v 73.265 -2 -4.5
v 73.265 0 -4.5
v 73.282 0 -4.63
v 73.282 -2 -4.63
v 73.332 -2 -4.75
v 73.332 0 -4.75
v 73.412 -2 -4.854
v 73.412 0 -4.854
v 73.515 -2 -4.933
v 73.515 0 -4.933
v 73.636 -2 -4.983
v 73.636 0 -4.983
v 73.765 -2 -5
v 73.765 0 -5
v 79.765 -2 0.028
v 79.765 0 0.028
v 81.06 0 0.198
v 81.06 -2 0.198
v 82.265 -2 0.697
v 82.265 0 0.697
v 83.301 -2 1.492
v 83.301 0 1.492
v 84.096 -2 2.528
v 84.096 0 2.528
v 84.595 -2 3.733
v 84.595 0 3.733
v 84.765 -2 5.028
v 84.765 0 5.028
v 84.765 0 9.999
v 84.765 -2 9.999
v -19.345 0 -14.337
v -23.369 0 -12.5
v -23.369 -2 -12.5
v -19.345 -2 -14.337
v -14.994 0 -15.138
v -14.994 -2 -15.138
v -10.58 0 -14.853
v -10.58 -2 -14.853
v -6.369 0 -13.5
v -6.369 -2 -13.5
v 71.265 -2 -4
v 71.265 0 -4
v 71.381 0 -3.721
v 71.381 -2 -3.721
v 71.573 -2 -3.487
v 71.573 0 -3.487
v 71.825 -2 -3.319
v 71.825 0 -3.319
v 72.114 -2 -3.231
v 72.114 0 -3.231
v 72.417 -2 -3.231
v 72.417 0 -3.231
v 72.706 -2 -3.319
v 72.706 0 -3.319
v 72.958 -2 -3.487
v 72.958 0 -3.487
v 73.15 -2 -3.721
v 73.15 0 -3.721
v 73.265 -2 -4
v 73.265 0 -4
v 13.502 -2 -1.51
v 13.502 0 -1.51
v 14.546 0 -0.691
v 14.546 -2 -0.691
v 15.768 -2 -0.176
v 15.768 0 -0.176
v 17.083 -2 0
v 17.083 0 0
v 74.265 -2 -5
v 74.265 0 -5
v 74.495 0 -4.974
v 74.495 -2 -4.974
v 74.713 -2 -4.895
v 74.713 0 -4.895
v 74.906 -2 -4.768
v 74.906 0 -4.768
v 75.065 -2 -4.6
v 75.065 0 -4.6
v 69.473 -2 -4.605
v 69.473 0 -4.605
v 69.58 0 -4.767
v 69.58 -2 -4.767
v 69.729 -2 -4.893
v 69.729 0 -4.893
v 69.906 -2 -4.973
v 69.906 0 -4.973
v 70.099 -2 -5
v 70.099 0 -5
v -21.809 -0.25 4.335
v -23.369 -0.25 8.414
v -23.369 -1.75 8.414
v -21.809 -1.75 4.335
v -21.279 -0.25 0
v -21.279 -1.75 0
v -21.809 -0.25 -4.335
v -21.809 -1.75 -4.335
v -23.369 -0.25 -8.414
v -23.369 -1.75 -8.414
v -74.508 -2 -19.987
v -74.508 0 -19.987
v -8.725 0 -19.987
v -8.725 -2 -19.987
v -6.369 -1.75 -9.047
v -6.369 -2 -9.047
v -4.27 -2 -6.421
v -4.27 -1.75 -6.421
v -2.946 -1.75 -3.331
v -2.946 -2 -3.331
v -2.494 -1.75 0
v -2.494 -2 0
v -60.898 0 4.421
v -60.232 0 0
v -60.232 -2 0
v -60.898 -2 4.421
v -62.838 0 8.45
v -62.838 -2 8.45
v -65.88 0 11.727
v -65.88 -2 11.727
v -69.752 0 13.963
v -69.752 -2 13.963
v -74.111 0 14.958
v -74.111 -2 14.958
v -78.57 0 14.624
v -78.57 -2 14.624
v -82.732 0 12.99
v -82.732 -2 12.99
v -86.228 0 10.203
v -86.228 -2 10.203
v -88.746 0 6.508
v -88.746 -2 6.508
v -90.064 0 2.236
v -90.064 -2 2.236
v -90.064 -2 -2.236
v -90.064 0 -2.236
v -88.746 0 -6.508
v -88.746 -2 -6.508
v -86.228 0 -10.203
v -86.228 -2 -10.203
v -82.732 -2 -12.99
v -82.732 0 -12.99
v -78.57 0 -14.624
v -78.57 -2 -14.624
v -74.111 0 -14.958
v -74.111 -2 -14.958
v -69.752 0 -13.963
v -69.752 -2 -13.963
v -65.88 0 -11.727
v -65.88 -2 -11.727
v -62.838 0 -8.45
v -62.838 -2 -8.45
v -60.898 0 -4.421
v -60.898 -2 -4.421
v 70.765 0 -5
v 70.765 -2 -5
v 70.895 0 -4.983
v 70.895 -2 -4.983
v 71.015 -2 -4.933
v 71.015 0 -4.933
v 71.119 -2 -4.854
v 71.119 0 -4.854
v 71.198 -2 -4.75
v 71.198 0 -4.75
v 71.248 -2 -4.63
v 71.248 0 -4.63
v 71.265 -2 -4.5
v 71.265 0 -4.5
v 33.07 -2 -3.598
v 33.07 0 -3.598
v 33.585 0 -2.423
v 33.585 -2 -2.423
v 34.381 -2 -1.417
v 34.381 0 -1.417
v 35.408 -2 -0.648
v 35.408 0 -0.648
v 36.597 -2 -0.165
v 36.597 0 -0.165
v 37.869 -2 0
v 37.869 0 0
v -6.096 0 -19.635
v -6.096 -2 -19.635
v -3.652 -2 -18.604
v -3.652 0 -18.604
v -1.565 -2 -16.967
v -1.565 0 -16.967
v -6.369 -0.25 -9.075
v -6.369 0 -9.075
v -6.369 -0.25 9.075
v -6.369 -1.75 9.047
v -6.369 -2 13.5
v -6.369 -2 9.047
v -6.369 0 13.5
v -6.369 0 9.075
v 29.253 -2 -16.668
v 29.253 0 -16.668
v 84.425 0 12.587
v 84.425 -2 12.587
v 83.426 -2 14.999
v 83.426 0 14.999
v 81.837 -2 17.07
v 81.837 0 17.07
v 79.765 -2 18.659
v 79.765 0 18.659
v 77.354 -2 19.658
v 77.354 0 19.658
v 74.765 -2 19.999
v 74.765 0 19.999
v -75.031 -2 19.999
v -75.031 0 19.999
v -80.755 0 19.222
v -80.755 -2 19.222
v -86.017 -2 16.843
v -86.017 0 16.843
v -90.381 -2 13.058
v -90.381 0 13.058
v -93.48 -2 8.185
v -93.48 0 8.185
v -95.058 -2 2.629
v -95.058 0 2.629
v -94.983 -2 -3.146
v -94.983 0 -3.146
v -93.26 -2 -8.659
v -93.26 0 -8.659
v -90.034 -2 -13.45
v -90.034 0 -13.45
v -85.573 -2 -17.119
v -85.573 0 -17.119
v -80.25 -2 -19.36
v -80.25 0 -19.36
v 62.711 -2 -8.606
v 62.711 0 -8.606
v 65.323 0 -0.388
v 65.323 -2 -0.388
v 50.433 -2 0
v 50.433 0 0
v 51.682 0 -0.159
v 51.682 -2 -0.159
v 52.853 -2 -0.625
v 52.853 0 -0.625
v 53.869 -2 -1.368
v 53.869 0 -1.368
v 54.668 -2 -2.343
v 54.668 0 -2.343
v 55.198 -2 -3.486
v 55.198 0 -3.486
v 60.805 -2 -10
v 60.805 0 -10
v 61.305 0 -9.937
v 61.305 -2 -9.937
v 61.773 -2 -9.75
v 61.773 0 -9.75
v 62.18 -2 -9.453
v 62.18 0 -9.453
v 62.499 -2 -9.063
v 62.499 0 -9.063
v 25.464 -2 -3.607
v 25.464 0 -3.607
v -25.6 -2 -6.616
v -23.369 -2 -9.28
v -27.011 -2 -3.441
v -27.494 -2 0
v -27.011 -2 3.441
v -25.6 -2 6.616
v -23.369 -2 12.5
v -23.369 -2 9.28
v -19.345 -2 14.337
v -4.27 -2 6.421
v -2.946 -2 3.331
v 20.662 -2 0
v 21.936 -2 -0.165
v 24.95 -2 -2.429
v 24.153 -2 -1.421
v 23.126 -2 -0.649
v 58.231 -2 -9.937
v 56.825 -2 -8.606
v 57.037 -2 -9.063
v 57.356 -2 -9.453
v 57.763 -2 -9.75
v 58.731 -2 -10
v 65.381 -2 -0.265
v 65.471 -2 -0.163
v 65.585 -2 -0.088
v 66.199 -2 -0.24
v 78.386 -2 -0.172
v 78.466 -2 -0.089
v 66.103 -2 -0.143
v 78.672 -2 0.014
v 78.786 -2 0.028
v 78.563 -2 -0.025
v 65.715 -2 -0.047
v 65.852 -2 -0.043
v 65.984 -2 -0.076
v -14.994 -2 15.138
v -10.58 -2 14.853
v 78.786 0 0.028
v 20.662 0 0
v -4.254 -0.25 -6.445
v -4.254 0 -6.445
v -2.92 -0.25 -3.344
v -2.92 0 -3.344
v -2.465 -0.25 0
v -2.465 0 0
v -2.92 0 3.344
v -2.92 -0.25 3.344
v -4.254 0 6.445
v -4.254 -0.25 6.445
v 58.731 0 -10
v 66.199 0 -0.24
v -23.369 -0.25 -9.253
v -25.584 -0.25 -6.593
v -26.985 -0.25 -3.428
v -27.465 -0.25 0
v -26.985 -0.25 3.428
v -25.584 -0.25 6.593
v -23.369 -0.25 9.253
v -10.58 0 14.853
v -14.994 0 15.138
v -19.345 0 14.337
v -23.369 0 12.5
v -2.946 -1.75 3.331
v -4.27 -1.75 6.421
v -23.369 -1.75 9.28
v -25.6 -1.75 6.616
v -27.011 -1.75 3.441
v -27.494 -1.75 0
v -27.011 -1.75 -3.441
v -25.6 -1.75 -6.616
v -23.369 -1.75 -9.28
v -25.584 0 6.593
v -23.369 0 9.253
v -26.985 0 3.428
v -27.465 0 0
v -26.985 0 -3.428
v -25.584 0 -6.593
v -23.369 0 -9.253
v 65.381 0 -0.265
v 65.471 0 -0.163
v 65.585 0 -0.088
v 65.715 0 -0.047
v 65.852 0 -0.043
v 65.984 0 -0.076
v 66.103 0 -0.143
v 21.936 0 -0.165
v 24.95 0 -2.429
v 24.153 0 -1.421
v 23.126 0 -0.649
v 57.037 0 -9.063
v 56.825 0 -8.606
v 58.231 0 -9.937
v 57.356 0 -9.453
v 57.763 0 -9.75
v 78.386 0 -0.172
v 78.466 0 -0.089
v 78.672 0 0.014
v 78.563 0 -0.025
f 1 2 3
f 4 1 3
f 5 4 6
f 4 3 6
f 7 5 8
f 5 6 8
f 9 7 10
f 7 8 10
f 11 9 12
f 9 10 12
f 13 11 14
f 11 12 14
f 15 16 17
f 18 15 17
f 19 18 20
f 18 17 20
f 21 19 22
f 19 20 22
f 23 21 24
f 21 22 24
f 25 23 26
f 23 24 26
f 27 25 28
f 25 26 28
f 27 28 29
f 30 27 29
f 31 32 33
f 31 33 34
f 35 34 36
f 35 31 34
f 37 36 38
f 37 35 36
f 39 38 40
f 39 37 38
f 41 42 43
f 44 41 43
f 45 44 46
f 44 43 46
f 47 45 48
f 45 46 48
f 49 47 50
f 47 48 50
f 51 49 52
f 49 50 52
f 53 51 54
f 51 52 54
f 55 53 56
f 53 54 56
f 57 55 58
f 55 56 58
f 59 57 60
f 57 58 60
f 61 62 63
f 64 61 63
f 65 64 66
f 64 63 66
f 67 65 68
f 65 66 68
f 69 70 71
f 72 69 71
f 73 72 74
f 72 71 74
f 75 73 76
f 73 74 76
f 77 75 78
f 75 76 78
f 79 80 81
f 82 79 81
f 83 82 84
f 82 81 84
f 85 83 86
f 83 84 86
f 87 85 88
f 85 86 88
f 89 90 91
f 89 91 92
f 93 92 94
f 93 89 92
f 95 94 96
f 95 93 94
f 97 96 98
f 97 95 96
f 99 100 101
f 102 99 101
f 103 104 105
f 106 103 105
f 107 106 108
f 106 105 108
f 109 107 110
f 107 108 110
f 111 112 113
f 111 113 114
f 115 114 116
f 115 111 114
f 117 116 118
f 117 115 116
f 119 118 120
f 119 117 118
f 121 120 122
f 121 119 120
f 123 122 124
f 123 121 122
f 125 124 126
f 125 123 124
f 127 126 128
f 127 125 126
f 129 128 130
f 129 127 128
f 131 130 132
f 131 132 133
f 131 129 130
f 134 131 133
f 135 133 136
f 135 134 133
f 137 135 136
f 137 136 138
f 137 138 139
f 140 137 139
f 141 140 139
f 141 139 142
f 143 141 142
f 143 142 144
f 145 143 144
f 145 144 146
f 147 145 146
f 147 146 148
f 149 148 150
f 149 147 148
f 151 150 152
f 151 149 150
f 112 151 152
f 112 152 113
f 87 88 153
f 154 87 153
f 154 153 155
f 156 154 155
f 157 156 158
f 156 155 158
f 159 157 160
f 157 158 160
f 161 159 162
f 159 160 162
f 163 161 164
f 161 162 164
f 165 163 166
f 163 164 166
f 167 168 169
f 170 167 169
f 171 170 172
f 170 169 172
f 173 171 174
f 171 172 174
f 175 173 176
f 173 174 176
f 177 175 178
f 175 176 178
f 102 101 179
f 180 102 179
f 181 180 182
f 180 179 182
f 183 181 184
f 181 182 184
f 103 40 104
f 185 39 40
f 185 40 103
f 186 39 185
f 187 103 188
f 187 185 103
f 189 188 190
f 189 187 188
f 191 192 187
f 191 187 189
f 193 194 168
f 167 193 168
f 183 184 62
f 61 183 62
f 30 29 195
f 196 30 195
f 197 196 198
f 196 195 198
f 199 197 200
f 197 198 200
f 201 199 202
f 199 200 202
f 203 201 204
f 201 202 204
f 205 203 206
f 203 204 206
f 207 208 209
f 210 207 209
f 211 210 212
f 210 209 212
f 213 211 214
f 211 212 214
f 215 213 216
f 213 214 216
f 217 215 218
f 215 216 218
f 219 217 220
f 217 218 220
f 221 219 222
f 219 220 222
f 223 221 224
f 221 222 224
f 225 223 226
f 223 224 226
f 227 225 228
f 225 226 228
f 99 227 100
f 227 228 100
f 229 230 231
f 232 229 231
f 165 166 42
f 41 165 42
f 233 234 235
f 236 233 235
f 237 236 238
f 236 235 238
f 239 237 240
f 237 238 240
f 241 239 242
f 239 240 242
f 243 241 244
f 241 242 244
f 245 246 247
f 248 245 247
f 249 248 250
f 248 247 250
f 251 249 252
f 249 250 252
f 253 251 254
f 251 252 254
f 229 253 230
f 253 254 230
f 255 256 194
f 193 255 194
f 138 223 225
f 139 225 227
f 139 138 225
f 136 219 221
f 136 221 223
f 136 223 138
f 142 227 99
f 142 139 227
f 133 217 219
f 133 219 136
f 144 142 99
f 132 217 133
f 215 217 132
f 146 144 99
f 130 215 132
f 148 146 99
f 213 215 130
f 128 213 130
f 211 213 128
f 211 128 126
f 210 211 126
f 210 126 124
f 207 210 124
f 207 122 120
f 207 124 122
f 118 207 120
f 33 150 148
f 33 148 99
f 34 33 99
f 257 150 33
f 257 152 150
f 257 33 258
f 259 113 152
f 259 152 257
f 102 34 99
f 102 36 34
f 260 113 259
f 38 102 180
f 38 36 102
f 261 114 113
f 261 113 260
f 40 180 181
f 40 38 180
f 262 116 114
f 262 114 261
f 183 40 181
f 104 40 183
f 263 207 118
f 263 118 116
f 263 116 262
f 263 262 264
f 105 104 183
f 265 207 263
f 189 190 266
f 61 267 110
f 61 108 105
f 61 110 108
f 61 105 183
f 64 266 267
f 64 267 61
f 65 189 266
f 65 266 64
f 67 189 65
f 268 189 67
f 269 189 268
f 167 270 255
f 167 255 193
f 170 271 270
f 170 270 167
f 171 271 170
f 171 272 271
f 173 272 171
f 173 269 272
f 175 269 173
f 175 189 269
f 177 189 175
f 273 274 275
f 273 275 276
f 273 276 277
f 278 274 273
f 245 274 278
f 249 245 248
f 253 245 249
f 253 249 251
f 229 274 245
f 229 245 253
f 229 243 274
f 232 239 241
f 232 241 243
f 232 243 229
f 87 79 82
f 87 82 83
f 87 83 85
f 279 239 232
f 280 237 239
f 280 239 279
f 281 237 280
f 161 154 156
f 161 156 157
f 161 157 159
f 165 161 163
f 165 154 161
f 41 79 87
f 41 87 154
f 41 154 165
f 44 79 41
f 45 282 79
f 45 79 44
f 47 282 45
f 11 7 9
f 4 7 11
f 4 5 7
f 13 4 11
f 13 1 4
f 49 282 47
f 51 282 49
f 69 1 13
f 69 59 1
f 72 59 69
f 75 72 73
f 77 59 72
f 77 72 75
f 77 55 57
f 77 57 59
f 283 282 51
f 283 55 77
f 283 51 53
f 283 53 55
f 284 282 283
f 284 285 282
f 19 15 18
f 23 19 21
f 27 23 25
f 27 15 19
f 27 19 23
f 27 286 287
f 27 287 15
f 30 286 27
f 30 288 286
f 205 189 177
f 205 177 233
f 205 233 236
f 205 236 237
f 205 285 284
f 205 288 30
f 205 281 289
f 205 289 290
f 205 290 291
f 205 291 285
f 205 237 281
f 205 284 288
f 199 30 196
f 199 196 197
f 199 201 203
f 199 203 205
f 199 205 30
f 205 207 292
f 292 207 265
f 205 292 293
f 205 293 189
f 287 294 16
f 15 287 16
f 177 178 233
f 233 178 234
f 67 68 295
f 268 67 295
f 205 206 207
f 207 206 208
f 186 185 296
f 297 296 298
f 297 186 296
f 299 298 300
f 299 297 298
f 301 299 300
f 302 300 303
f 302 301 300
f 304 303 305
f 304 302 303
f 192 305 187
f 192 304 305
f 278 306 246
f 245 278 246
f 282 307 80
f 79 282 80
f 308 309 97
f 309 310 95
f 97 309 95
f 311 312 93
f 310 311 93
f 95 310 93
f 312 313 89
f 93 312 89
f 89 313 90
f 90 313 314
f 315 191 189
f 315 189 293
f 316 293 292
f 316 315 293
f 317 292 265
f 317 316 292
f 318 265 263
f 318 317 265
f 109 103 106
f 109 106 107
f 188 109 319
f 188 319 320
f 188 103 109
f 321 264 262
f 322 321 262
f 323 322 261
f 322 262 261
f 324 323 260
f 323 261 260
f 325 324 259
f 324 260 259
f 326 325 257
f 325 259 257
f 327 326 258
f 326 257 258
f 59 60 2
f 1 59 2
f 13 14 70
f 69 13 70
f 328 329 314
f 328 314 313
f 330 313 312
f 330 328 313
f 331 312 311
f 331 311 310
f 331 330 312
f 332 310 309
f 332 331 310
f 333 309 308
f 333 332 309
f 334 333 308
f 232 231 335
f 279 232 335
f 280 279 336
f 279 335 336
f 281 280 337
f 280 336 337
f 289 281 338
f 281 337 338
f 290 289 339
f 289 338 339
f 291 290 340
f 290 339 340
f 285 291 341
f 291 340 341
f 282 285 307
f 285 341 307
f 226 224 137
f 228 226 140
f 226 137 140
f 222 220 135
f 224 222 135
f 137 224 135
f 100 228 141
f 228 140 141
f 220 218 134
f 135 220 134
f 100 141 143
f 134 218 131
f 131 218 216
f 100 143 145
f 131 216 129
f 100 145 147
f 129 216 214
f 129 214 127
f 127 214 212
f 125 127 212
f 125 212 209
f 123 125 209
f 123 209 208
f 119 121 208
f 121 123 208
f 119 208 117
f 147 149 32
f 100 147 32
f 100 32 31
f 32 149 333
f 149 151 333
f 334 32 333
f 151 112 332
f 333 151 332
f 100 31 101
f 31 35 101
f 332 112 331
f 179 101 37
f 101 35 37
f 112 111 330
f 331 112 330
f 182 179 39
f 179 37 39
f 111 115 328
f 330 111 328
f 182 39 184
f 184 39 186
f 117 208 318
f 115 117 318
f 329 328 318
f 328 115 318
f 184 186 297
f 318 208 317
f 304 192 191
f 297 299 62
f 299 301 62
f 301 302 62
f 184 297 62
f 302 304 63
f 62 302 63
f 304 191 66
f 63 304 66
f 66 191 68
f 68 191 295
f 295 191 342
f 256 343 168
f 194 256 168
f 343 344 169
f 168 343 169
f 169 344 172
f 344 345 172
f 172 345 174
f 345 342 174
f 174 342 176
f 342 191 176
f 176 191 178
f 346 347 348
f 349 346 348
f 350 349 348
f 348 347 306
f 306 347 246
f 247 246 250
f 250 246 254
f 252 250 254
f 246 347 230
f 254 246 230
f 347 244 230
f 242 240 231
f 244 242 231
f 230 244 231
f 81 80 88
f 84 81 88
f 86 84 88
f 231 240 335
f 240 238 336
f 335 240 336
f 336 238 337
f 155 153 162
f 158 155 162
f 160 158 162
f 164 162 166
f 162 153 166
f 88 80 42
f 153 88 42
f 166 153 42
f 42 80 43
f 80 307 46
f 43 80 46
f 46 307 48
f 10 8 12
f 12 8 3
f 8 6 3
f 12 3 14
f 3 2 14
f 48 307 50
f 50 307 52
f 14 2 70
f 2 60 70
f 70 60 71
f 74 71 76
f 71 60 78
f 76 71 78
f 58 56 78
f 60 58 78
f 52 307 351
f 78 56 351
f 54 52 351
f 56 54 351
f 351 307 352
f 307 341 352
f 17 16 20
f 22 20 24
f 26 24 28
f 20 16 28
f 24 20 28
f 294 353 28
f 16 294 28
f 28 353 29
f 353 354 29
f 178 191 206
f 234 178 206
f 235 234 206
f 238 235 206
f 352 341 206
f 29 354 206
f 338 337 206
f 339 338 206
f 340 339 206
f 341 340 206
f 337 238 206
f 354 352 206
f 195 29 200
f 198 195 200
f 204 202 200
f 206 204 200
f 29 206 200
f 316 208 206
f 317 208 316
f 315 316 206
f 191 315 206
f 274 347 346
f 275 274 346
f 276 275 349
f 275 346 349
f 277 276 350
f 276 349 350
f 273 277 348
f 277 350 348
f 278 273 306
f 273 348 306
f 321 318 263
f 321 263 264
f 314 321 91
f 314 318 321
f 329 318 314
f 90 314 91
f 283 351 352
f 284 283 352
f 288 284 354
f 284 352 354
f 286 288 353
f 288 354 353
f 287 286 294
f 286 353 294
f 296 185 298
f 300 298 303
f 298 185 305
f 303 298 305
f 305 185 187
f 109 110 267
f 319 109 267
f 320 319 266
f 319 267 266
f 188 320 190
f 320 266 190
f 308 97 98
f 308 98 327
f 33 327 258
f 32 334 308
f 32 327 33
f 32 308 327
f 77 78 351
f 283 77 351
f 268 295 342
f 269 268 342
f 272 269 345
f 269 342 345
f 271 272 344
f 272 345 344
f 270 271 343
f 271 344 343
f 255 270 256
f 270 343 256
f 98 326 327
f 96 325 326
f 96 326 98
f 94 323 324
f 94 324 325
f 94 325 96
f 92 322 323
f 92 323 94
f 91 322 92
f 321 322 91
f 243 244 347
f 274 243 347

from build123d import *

# Parameters (mm, degrees)
F0_R     = 15
F1_DEPTH = 2
F3_DEPTH = 2.001
F5_DEPTH = 0.25
F6_R     = 12.5
F7_DEPTH = 0.25


with BuildPart() as f1:
    # F0 (on Front) → F1 (new body)
    with BuildSketch(Plane.XZ):
        with BuildLine():
            Line((74.7654586344, 19.9989924685), (-75.0312126981, 19.9989924685))
            ThreePointArc((-75.0312126981, 19.9989924685), (-95.2302513379, -0.261571778), (-74.5082089138, -19.9869002501))
            Line((-74.5082089138, -19.9869002501), (-8.7254105168, -19.9869002501))
            ThreePointArc((-8.7254105168, -19.9869002501), (-4.839616653, -19.2010527368), (-1.5645510783, -16.9670214598))
            Line((-1.5645510783, -16.9670214598), (13.5023982574, -1.5099393951))
            ThreePointArc((13.5023982574, -1.5099393951), (15.1399310448, -0.3929237566), (17.0828279766, 0))
            Line((17.0828279766, 0), (20.6616625341, 0))
            ThreePointArc((20.6616625341, 0), (23.6645705828, -1.0021826891), (25.4636936461, -3.6069826995))
            Line((25.4636936461, -3.6069826995), (29.2526781559, -16.6684295982))
            Line((29.2526781559, -16.6684295982), (33.0697437835, -3.5983243492))
            ThreePointArc((33.0697437835, -3.5983243492), (34.8699530038, -0.9994763934), (37.8692547347, 0))
            Line((37.8692547347, 0), (50.4326597146, 0))
            ThreePointArc((50.4326597146, 0), (53.3846342659, -0.9644273952), (55.1978227663, -3.4856615005))
            Line((55.1978227663, -3.4856615005), (56.8249496751, -8.6057353998))
            ThreePointArc((56.8249496751, -8.6057353998), (57.5502250753, -9.6142290419), (58.7310148958, -10))
            Line((58.7310148958, -10), (60.8050612923, -10))
            ThreePointArc((60.8050612923, -10), (61.9858511128, -9.6142290419), (62.711126513, -8.6057353998))
            Line((62.711126513, -8.6057353998), (65.3225235362, -0.3884625696))
            ThreePointArc((65.3225235362, -0.3884625696), (65.7154835042, -0.0469275173), (66.1990398413, -0.2398964195))
            Line((66.1990398413, -0.2398964195), (69.4730335519, -4.6052213669))
            ThreePointArc((69.4730335519, -4.6052213669), (69.7287348247, -4.8933610183), (70.0987919677, -5.0004372085))
            Line((70.0987919677, -5.0004372085), (70.7654586344, -5.0004372085))
            ThreePointArc((70.7654586344, -5.0004372085), (71.119012025, -4.8539905991), (71.2654586344, -4.5004372085))
            Line((71.2654586344, -4.5004372085), (71.2654586344, -4.0004372085))
            ThreePointArc((71.2654586344, -4.0004372085), (72.2654586344, -3.2196608021), (73.2654586344, -4.0004372085))
            Line((73.2654586344, -4.0004372085), (73.2654586344, -4.5004372085))
            ThreePointArc((73.2654586344, -4.5004372085), (73.4119052438, -4.8539905991), (73.7654586344, -5.0004372085))
            Line((73.7654586344, -5.0004372085), (74.2654586344, -5.0004372085))
            ThreePointArc((74.2654586344, -5.0004372085), (74.7126722299, -4.8948643995), (75.0654586344, -4.6004372085))
            Line((75.0654586344, -4.6004372085), (78.3864482289, -0.1724510824))
            ThreePointArc((78.3864482289, -0.1724510824), (78.5628414312, -0.0252374869), (78.7864482289, 0.0275489176))
            Line((78.7864482289, 0.0275489176), (79.7654586344, 0.0275489176))
            ThreePointArc((79.7654586344, 0.0275489176), (83.3009925403, 1.4920150116), (84.7654586344, 5.0275489176))
            Line((84.7654586344, 5.0275489176), (84.7654586344, 9.9989924685))
            ThreePointArc((84.7654586344, 9.9989924685), (81.8365264462, 17.0700602804), (74.7654586344, 19.9989924685))
        make_face()
        with Locations((-75.231961906, 0)):
            Circle(F0_R, mode=Mode.SUBTRACT)
    extrude(amount=F1_DEPTH)

    # F2 (on Front) → F3 (cut, through all)
    with BuildSketch(Plane.XZ):
        with BuildLine():
            Line((-6.3686813228, -13.5), (-6.3686813228, 0))
            Line((-6.3686813228, 0), (-6.3686813228, 13.5))
            ThreePointArc((-6.3686813228, 13.5), (-14.9944197626, 15.137553477), (-23.3686813228, 12.5))
            Line((-23.3686813228, 12.5), (-23.3686813228, 8.413849912))
            ThreePointArc((-23.3686813228, 8.413849912), (-21.2785048492, 0), (-23.3686813228, -8.413849912))
            Line((-23.3686813228, -8.413849912), (-23.3686813228, -12.5))
            ThreePointArc((-23.3686813228, -12.5), (-14.9944197626, -15.137553477), (-6.3686813228, -13.5))
        make_face()
    extrude(amount=F3_DEPTH, mode=Mode.SUBTRACT)

    # F4 (on face) → F5 (cut)
    with BuildSketch(Plane.XZ.offset(2)):
        with BuildLine():
            Line((-23.3686813228, 8.413849912), (-23.3686813228, 9.2801801341))
            ThreePointArc((-23.3686813228, 9.2801801341), (-27.4944197626, 0), (-23.3686813228, -9.2801801341))
            Line((-23.3686813228, -9.2801801341), (-23.3686813228, -8.413849912))
            ThreePointArc((-23.3686813228, -8.413849912), (-21.2785048492, 0), (-23.3686813228, 8.413849912))
        make_face()
        with BuildLine():
            ThreePointArc((-6.3686813228, -9.046913085), (-3.5037337409, -4.9207859892), (-2.4944197626, 0))
            ThreePointArc((-2.4944197626, 0), (-3.5037337409, 4.9207859892), (-6.3686813228, 9.046913085))
            Line((-6.3686813228, 9.046913085), (-6.3686813228, -9.046913085))
        make_face()
    extrude(amount=-F5_DEPTH, mode=Mode.SUBTRACT)

    # F6 (on Front) → F7 (cut)
    with BuildSketch(Plane.XZ):
        with Locations((-14.9645612109, 0)):
            Circle(F6_R)
    extrude(amount=F7_DEPTH, mode=Mode.SUBTRACT)


solid = f1.part
